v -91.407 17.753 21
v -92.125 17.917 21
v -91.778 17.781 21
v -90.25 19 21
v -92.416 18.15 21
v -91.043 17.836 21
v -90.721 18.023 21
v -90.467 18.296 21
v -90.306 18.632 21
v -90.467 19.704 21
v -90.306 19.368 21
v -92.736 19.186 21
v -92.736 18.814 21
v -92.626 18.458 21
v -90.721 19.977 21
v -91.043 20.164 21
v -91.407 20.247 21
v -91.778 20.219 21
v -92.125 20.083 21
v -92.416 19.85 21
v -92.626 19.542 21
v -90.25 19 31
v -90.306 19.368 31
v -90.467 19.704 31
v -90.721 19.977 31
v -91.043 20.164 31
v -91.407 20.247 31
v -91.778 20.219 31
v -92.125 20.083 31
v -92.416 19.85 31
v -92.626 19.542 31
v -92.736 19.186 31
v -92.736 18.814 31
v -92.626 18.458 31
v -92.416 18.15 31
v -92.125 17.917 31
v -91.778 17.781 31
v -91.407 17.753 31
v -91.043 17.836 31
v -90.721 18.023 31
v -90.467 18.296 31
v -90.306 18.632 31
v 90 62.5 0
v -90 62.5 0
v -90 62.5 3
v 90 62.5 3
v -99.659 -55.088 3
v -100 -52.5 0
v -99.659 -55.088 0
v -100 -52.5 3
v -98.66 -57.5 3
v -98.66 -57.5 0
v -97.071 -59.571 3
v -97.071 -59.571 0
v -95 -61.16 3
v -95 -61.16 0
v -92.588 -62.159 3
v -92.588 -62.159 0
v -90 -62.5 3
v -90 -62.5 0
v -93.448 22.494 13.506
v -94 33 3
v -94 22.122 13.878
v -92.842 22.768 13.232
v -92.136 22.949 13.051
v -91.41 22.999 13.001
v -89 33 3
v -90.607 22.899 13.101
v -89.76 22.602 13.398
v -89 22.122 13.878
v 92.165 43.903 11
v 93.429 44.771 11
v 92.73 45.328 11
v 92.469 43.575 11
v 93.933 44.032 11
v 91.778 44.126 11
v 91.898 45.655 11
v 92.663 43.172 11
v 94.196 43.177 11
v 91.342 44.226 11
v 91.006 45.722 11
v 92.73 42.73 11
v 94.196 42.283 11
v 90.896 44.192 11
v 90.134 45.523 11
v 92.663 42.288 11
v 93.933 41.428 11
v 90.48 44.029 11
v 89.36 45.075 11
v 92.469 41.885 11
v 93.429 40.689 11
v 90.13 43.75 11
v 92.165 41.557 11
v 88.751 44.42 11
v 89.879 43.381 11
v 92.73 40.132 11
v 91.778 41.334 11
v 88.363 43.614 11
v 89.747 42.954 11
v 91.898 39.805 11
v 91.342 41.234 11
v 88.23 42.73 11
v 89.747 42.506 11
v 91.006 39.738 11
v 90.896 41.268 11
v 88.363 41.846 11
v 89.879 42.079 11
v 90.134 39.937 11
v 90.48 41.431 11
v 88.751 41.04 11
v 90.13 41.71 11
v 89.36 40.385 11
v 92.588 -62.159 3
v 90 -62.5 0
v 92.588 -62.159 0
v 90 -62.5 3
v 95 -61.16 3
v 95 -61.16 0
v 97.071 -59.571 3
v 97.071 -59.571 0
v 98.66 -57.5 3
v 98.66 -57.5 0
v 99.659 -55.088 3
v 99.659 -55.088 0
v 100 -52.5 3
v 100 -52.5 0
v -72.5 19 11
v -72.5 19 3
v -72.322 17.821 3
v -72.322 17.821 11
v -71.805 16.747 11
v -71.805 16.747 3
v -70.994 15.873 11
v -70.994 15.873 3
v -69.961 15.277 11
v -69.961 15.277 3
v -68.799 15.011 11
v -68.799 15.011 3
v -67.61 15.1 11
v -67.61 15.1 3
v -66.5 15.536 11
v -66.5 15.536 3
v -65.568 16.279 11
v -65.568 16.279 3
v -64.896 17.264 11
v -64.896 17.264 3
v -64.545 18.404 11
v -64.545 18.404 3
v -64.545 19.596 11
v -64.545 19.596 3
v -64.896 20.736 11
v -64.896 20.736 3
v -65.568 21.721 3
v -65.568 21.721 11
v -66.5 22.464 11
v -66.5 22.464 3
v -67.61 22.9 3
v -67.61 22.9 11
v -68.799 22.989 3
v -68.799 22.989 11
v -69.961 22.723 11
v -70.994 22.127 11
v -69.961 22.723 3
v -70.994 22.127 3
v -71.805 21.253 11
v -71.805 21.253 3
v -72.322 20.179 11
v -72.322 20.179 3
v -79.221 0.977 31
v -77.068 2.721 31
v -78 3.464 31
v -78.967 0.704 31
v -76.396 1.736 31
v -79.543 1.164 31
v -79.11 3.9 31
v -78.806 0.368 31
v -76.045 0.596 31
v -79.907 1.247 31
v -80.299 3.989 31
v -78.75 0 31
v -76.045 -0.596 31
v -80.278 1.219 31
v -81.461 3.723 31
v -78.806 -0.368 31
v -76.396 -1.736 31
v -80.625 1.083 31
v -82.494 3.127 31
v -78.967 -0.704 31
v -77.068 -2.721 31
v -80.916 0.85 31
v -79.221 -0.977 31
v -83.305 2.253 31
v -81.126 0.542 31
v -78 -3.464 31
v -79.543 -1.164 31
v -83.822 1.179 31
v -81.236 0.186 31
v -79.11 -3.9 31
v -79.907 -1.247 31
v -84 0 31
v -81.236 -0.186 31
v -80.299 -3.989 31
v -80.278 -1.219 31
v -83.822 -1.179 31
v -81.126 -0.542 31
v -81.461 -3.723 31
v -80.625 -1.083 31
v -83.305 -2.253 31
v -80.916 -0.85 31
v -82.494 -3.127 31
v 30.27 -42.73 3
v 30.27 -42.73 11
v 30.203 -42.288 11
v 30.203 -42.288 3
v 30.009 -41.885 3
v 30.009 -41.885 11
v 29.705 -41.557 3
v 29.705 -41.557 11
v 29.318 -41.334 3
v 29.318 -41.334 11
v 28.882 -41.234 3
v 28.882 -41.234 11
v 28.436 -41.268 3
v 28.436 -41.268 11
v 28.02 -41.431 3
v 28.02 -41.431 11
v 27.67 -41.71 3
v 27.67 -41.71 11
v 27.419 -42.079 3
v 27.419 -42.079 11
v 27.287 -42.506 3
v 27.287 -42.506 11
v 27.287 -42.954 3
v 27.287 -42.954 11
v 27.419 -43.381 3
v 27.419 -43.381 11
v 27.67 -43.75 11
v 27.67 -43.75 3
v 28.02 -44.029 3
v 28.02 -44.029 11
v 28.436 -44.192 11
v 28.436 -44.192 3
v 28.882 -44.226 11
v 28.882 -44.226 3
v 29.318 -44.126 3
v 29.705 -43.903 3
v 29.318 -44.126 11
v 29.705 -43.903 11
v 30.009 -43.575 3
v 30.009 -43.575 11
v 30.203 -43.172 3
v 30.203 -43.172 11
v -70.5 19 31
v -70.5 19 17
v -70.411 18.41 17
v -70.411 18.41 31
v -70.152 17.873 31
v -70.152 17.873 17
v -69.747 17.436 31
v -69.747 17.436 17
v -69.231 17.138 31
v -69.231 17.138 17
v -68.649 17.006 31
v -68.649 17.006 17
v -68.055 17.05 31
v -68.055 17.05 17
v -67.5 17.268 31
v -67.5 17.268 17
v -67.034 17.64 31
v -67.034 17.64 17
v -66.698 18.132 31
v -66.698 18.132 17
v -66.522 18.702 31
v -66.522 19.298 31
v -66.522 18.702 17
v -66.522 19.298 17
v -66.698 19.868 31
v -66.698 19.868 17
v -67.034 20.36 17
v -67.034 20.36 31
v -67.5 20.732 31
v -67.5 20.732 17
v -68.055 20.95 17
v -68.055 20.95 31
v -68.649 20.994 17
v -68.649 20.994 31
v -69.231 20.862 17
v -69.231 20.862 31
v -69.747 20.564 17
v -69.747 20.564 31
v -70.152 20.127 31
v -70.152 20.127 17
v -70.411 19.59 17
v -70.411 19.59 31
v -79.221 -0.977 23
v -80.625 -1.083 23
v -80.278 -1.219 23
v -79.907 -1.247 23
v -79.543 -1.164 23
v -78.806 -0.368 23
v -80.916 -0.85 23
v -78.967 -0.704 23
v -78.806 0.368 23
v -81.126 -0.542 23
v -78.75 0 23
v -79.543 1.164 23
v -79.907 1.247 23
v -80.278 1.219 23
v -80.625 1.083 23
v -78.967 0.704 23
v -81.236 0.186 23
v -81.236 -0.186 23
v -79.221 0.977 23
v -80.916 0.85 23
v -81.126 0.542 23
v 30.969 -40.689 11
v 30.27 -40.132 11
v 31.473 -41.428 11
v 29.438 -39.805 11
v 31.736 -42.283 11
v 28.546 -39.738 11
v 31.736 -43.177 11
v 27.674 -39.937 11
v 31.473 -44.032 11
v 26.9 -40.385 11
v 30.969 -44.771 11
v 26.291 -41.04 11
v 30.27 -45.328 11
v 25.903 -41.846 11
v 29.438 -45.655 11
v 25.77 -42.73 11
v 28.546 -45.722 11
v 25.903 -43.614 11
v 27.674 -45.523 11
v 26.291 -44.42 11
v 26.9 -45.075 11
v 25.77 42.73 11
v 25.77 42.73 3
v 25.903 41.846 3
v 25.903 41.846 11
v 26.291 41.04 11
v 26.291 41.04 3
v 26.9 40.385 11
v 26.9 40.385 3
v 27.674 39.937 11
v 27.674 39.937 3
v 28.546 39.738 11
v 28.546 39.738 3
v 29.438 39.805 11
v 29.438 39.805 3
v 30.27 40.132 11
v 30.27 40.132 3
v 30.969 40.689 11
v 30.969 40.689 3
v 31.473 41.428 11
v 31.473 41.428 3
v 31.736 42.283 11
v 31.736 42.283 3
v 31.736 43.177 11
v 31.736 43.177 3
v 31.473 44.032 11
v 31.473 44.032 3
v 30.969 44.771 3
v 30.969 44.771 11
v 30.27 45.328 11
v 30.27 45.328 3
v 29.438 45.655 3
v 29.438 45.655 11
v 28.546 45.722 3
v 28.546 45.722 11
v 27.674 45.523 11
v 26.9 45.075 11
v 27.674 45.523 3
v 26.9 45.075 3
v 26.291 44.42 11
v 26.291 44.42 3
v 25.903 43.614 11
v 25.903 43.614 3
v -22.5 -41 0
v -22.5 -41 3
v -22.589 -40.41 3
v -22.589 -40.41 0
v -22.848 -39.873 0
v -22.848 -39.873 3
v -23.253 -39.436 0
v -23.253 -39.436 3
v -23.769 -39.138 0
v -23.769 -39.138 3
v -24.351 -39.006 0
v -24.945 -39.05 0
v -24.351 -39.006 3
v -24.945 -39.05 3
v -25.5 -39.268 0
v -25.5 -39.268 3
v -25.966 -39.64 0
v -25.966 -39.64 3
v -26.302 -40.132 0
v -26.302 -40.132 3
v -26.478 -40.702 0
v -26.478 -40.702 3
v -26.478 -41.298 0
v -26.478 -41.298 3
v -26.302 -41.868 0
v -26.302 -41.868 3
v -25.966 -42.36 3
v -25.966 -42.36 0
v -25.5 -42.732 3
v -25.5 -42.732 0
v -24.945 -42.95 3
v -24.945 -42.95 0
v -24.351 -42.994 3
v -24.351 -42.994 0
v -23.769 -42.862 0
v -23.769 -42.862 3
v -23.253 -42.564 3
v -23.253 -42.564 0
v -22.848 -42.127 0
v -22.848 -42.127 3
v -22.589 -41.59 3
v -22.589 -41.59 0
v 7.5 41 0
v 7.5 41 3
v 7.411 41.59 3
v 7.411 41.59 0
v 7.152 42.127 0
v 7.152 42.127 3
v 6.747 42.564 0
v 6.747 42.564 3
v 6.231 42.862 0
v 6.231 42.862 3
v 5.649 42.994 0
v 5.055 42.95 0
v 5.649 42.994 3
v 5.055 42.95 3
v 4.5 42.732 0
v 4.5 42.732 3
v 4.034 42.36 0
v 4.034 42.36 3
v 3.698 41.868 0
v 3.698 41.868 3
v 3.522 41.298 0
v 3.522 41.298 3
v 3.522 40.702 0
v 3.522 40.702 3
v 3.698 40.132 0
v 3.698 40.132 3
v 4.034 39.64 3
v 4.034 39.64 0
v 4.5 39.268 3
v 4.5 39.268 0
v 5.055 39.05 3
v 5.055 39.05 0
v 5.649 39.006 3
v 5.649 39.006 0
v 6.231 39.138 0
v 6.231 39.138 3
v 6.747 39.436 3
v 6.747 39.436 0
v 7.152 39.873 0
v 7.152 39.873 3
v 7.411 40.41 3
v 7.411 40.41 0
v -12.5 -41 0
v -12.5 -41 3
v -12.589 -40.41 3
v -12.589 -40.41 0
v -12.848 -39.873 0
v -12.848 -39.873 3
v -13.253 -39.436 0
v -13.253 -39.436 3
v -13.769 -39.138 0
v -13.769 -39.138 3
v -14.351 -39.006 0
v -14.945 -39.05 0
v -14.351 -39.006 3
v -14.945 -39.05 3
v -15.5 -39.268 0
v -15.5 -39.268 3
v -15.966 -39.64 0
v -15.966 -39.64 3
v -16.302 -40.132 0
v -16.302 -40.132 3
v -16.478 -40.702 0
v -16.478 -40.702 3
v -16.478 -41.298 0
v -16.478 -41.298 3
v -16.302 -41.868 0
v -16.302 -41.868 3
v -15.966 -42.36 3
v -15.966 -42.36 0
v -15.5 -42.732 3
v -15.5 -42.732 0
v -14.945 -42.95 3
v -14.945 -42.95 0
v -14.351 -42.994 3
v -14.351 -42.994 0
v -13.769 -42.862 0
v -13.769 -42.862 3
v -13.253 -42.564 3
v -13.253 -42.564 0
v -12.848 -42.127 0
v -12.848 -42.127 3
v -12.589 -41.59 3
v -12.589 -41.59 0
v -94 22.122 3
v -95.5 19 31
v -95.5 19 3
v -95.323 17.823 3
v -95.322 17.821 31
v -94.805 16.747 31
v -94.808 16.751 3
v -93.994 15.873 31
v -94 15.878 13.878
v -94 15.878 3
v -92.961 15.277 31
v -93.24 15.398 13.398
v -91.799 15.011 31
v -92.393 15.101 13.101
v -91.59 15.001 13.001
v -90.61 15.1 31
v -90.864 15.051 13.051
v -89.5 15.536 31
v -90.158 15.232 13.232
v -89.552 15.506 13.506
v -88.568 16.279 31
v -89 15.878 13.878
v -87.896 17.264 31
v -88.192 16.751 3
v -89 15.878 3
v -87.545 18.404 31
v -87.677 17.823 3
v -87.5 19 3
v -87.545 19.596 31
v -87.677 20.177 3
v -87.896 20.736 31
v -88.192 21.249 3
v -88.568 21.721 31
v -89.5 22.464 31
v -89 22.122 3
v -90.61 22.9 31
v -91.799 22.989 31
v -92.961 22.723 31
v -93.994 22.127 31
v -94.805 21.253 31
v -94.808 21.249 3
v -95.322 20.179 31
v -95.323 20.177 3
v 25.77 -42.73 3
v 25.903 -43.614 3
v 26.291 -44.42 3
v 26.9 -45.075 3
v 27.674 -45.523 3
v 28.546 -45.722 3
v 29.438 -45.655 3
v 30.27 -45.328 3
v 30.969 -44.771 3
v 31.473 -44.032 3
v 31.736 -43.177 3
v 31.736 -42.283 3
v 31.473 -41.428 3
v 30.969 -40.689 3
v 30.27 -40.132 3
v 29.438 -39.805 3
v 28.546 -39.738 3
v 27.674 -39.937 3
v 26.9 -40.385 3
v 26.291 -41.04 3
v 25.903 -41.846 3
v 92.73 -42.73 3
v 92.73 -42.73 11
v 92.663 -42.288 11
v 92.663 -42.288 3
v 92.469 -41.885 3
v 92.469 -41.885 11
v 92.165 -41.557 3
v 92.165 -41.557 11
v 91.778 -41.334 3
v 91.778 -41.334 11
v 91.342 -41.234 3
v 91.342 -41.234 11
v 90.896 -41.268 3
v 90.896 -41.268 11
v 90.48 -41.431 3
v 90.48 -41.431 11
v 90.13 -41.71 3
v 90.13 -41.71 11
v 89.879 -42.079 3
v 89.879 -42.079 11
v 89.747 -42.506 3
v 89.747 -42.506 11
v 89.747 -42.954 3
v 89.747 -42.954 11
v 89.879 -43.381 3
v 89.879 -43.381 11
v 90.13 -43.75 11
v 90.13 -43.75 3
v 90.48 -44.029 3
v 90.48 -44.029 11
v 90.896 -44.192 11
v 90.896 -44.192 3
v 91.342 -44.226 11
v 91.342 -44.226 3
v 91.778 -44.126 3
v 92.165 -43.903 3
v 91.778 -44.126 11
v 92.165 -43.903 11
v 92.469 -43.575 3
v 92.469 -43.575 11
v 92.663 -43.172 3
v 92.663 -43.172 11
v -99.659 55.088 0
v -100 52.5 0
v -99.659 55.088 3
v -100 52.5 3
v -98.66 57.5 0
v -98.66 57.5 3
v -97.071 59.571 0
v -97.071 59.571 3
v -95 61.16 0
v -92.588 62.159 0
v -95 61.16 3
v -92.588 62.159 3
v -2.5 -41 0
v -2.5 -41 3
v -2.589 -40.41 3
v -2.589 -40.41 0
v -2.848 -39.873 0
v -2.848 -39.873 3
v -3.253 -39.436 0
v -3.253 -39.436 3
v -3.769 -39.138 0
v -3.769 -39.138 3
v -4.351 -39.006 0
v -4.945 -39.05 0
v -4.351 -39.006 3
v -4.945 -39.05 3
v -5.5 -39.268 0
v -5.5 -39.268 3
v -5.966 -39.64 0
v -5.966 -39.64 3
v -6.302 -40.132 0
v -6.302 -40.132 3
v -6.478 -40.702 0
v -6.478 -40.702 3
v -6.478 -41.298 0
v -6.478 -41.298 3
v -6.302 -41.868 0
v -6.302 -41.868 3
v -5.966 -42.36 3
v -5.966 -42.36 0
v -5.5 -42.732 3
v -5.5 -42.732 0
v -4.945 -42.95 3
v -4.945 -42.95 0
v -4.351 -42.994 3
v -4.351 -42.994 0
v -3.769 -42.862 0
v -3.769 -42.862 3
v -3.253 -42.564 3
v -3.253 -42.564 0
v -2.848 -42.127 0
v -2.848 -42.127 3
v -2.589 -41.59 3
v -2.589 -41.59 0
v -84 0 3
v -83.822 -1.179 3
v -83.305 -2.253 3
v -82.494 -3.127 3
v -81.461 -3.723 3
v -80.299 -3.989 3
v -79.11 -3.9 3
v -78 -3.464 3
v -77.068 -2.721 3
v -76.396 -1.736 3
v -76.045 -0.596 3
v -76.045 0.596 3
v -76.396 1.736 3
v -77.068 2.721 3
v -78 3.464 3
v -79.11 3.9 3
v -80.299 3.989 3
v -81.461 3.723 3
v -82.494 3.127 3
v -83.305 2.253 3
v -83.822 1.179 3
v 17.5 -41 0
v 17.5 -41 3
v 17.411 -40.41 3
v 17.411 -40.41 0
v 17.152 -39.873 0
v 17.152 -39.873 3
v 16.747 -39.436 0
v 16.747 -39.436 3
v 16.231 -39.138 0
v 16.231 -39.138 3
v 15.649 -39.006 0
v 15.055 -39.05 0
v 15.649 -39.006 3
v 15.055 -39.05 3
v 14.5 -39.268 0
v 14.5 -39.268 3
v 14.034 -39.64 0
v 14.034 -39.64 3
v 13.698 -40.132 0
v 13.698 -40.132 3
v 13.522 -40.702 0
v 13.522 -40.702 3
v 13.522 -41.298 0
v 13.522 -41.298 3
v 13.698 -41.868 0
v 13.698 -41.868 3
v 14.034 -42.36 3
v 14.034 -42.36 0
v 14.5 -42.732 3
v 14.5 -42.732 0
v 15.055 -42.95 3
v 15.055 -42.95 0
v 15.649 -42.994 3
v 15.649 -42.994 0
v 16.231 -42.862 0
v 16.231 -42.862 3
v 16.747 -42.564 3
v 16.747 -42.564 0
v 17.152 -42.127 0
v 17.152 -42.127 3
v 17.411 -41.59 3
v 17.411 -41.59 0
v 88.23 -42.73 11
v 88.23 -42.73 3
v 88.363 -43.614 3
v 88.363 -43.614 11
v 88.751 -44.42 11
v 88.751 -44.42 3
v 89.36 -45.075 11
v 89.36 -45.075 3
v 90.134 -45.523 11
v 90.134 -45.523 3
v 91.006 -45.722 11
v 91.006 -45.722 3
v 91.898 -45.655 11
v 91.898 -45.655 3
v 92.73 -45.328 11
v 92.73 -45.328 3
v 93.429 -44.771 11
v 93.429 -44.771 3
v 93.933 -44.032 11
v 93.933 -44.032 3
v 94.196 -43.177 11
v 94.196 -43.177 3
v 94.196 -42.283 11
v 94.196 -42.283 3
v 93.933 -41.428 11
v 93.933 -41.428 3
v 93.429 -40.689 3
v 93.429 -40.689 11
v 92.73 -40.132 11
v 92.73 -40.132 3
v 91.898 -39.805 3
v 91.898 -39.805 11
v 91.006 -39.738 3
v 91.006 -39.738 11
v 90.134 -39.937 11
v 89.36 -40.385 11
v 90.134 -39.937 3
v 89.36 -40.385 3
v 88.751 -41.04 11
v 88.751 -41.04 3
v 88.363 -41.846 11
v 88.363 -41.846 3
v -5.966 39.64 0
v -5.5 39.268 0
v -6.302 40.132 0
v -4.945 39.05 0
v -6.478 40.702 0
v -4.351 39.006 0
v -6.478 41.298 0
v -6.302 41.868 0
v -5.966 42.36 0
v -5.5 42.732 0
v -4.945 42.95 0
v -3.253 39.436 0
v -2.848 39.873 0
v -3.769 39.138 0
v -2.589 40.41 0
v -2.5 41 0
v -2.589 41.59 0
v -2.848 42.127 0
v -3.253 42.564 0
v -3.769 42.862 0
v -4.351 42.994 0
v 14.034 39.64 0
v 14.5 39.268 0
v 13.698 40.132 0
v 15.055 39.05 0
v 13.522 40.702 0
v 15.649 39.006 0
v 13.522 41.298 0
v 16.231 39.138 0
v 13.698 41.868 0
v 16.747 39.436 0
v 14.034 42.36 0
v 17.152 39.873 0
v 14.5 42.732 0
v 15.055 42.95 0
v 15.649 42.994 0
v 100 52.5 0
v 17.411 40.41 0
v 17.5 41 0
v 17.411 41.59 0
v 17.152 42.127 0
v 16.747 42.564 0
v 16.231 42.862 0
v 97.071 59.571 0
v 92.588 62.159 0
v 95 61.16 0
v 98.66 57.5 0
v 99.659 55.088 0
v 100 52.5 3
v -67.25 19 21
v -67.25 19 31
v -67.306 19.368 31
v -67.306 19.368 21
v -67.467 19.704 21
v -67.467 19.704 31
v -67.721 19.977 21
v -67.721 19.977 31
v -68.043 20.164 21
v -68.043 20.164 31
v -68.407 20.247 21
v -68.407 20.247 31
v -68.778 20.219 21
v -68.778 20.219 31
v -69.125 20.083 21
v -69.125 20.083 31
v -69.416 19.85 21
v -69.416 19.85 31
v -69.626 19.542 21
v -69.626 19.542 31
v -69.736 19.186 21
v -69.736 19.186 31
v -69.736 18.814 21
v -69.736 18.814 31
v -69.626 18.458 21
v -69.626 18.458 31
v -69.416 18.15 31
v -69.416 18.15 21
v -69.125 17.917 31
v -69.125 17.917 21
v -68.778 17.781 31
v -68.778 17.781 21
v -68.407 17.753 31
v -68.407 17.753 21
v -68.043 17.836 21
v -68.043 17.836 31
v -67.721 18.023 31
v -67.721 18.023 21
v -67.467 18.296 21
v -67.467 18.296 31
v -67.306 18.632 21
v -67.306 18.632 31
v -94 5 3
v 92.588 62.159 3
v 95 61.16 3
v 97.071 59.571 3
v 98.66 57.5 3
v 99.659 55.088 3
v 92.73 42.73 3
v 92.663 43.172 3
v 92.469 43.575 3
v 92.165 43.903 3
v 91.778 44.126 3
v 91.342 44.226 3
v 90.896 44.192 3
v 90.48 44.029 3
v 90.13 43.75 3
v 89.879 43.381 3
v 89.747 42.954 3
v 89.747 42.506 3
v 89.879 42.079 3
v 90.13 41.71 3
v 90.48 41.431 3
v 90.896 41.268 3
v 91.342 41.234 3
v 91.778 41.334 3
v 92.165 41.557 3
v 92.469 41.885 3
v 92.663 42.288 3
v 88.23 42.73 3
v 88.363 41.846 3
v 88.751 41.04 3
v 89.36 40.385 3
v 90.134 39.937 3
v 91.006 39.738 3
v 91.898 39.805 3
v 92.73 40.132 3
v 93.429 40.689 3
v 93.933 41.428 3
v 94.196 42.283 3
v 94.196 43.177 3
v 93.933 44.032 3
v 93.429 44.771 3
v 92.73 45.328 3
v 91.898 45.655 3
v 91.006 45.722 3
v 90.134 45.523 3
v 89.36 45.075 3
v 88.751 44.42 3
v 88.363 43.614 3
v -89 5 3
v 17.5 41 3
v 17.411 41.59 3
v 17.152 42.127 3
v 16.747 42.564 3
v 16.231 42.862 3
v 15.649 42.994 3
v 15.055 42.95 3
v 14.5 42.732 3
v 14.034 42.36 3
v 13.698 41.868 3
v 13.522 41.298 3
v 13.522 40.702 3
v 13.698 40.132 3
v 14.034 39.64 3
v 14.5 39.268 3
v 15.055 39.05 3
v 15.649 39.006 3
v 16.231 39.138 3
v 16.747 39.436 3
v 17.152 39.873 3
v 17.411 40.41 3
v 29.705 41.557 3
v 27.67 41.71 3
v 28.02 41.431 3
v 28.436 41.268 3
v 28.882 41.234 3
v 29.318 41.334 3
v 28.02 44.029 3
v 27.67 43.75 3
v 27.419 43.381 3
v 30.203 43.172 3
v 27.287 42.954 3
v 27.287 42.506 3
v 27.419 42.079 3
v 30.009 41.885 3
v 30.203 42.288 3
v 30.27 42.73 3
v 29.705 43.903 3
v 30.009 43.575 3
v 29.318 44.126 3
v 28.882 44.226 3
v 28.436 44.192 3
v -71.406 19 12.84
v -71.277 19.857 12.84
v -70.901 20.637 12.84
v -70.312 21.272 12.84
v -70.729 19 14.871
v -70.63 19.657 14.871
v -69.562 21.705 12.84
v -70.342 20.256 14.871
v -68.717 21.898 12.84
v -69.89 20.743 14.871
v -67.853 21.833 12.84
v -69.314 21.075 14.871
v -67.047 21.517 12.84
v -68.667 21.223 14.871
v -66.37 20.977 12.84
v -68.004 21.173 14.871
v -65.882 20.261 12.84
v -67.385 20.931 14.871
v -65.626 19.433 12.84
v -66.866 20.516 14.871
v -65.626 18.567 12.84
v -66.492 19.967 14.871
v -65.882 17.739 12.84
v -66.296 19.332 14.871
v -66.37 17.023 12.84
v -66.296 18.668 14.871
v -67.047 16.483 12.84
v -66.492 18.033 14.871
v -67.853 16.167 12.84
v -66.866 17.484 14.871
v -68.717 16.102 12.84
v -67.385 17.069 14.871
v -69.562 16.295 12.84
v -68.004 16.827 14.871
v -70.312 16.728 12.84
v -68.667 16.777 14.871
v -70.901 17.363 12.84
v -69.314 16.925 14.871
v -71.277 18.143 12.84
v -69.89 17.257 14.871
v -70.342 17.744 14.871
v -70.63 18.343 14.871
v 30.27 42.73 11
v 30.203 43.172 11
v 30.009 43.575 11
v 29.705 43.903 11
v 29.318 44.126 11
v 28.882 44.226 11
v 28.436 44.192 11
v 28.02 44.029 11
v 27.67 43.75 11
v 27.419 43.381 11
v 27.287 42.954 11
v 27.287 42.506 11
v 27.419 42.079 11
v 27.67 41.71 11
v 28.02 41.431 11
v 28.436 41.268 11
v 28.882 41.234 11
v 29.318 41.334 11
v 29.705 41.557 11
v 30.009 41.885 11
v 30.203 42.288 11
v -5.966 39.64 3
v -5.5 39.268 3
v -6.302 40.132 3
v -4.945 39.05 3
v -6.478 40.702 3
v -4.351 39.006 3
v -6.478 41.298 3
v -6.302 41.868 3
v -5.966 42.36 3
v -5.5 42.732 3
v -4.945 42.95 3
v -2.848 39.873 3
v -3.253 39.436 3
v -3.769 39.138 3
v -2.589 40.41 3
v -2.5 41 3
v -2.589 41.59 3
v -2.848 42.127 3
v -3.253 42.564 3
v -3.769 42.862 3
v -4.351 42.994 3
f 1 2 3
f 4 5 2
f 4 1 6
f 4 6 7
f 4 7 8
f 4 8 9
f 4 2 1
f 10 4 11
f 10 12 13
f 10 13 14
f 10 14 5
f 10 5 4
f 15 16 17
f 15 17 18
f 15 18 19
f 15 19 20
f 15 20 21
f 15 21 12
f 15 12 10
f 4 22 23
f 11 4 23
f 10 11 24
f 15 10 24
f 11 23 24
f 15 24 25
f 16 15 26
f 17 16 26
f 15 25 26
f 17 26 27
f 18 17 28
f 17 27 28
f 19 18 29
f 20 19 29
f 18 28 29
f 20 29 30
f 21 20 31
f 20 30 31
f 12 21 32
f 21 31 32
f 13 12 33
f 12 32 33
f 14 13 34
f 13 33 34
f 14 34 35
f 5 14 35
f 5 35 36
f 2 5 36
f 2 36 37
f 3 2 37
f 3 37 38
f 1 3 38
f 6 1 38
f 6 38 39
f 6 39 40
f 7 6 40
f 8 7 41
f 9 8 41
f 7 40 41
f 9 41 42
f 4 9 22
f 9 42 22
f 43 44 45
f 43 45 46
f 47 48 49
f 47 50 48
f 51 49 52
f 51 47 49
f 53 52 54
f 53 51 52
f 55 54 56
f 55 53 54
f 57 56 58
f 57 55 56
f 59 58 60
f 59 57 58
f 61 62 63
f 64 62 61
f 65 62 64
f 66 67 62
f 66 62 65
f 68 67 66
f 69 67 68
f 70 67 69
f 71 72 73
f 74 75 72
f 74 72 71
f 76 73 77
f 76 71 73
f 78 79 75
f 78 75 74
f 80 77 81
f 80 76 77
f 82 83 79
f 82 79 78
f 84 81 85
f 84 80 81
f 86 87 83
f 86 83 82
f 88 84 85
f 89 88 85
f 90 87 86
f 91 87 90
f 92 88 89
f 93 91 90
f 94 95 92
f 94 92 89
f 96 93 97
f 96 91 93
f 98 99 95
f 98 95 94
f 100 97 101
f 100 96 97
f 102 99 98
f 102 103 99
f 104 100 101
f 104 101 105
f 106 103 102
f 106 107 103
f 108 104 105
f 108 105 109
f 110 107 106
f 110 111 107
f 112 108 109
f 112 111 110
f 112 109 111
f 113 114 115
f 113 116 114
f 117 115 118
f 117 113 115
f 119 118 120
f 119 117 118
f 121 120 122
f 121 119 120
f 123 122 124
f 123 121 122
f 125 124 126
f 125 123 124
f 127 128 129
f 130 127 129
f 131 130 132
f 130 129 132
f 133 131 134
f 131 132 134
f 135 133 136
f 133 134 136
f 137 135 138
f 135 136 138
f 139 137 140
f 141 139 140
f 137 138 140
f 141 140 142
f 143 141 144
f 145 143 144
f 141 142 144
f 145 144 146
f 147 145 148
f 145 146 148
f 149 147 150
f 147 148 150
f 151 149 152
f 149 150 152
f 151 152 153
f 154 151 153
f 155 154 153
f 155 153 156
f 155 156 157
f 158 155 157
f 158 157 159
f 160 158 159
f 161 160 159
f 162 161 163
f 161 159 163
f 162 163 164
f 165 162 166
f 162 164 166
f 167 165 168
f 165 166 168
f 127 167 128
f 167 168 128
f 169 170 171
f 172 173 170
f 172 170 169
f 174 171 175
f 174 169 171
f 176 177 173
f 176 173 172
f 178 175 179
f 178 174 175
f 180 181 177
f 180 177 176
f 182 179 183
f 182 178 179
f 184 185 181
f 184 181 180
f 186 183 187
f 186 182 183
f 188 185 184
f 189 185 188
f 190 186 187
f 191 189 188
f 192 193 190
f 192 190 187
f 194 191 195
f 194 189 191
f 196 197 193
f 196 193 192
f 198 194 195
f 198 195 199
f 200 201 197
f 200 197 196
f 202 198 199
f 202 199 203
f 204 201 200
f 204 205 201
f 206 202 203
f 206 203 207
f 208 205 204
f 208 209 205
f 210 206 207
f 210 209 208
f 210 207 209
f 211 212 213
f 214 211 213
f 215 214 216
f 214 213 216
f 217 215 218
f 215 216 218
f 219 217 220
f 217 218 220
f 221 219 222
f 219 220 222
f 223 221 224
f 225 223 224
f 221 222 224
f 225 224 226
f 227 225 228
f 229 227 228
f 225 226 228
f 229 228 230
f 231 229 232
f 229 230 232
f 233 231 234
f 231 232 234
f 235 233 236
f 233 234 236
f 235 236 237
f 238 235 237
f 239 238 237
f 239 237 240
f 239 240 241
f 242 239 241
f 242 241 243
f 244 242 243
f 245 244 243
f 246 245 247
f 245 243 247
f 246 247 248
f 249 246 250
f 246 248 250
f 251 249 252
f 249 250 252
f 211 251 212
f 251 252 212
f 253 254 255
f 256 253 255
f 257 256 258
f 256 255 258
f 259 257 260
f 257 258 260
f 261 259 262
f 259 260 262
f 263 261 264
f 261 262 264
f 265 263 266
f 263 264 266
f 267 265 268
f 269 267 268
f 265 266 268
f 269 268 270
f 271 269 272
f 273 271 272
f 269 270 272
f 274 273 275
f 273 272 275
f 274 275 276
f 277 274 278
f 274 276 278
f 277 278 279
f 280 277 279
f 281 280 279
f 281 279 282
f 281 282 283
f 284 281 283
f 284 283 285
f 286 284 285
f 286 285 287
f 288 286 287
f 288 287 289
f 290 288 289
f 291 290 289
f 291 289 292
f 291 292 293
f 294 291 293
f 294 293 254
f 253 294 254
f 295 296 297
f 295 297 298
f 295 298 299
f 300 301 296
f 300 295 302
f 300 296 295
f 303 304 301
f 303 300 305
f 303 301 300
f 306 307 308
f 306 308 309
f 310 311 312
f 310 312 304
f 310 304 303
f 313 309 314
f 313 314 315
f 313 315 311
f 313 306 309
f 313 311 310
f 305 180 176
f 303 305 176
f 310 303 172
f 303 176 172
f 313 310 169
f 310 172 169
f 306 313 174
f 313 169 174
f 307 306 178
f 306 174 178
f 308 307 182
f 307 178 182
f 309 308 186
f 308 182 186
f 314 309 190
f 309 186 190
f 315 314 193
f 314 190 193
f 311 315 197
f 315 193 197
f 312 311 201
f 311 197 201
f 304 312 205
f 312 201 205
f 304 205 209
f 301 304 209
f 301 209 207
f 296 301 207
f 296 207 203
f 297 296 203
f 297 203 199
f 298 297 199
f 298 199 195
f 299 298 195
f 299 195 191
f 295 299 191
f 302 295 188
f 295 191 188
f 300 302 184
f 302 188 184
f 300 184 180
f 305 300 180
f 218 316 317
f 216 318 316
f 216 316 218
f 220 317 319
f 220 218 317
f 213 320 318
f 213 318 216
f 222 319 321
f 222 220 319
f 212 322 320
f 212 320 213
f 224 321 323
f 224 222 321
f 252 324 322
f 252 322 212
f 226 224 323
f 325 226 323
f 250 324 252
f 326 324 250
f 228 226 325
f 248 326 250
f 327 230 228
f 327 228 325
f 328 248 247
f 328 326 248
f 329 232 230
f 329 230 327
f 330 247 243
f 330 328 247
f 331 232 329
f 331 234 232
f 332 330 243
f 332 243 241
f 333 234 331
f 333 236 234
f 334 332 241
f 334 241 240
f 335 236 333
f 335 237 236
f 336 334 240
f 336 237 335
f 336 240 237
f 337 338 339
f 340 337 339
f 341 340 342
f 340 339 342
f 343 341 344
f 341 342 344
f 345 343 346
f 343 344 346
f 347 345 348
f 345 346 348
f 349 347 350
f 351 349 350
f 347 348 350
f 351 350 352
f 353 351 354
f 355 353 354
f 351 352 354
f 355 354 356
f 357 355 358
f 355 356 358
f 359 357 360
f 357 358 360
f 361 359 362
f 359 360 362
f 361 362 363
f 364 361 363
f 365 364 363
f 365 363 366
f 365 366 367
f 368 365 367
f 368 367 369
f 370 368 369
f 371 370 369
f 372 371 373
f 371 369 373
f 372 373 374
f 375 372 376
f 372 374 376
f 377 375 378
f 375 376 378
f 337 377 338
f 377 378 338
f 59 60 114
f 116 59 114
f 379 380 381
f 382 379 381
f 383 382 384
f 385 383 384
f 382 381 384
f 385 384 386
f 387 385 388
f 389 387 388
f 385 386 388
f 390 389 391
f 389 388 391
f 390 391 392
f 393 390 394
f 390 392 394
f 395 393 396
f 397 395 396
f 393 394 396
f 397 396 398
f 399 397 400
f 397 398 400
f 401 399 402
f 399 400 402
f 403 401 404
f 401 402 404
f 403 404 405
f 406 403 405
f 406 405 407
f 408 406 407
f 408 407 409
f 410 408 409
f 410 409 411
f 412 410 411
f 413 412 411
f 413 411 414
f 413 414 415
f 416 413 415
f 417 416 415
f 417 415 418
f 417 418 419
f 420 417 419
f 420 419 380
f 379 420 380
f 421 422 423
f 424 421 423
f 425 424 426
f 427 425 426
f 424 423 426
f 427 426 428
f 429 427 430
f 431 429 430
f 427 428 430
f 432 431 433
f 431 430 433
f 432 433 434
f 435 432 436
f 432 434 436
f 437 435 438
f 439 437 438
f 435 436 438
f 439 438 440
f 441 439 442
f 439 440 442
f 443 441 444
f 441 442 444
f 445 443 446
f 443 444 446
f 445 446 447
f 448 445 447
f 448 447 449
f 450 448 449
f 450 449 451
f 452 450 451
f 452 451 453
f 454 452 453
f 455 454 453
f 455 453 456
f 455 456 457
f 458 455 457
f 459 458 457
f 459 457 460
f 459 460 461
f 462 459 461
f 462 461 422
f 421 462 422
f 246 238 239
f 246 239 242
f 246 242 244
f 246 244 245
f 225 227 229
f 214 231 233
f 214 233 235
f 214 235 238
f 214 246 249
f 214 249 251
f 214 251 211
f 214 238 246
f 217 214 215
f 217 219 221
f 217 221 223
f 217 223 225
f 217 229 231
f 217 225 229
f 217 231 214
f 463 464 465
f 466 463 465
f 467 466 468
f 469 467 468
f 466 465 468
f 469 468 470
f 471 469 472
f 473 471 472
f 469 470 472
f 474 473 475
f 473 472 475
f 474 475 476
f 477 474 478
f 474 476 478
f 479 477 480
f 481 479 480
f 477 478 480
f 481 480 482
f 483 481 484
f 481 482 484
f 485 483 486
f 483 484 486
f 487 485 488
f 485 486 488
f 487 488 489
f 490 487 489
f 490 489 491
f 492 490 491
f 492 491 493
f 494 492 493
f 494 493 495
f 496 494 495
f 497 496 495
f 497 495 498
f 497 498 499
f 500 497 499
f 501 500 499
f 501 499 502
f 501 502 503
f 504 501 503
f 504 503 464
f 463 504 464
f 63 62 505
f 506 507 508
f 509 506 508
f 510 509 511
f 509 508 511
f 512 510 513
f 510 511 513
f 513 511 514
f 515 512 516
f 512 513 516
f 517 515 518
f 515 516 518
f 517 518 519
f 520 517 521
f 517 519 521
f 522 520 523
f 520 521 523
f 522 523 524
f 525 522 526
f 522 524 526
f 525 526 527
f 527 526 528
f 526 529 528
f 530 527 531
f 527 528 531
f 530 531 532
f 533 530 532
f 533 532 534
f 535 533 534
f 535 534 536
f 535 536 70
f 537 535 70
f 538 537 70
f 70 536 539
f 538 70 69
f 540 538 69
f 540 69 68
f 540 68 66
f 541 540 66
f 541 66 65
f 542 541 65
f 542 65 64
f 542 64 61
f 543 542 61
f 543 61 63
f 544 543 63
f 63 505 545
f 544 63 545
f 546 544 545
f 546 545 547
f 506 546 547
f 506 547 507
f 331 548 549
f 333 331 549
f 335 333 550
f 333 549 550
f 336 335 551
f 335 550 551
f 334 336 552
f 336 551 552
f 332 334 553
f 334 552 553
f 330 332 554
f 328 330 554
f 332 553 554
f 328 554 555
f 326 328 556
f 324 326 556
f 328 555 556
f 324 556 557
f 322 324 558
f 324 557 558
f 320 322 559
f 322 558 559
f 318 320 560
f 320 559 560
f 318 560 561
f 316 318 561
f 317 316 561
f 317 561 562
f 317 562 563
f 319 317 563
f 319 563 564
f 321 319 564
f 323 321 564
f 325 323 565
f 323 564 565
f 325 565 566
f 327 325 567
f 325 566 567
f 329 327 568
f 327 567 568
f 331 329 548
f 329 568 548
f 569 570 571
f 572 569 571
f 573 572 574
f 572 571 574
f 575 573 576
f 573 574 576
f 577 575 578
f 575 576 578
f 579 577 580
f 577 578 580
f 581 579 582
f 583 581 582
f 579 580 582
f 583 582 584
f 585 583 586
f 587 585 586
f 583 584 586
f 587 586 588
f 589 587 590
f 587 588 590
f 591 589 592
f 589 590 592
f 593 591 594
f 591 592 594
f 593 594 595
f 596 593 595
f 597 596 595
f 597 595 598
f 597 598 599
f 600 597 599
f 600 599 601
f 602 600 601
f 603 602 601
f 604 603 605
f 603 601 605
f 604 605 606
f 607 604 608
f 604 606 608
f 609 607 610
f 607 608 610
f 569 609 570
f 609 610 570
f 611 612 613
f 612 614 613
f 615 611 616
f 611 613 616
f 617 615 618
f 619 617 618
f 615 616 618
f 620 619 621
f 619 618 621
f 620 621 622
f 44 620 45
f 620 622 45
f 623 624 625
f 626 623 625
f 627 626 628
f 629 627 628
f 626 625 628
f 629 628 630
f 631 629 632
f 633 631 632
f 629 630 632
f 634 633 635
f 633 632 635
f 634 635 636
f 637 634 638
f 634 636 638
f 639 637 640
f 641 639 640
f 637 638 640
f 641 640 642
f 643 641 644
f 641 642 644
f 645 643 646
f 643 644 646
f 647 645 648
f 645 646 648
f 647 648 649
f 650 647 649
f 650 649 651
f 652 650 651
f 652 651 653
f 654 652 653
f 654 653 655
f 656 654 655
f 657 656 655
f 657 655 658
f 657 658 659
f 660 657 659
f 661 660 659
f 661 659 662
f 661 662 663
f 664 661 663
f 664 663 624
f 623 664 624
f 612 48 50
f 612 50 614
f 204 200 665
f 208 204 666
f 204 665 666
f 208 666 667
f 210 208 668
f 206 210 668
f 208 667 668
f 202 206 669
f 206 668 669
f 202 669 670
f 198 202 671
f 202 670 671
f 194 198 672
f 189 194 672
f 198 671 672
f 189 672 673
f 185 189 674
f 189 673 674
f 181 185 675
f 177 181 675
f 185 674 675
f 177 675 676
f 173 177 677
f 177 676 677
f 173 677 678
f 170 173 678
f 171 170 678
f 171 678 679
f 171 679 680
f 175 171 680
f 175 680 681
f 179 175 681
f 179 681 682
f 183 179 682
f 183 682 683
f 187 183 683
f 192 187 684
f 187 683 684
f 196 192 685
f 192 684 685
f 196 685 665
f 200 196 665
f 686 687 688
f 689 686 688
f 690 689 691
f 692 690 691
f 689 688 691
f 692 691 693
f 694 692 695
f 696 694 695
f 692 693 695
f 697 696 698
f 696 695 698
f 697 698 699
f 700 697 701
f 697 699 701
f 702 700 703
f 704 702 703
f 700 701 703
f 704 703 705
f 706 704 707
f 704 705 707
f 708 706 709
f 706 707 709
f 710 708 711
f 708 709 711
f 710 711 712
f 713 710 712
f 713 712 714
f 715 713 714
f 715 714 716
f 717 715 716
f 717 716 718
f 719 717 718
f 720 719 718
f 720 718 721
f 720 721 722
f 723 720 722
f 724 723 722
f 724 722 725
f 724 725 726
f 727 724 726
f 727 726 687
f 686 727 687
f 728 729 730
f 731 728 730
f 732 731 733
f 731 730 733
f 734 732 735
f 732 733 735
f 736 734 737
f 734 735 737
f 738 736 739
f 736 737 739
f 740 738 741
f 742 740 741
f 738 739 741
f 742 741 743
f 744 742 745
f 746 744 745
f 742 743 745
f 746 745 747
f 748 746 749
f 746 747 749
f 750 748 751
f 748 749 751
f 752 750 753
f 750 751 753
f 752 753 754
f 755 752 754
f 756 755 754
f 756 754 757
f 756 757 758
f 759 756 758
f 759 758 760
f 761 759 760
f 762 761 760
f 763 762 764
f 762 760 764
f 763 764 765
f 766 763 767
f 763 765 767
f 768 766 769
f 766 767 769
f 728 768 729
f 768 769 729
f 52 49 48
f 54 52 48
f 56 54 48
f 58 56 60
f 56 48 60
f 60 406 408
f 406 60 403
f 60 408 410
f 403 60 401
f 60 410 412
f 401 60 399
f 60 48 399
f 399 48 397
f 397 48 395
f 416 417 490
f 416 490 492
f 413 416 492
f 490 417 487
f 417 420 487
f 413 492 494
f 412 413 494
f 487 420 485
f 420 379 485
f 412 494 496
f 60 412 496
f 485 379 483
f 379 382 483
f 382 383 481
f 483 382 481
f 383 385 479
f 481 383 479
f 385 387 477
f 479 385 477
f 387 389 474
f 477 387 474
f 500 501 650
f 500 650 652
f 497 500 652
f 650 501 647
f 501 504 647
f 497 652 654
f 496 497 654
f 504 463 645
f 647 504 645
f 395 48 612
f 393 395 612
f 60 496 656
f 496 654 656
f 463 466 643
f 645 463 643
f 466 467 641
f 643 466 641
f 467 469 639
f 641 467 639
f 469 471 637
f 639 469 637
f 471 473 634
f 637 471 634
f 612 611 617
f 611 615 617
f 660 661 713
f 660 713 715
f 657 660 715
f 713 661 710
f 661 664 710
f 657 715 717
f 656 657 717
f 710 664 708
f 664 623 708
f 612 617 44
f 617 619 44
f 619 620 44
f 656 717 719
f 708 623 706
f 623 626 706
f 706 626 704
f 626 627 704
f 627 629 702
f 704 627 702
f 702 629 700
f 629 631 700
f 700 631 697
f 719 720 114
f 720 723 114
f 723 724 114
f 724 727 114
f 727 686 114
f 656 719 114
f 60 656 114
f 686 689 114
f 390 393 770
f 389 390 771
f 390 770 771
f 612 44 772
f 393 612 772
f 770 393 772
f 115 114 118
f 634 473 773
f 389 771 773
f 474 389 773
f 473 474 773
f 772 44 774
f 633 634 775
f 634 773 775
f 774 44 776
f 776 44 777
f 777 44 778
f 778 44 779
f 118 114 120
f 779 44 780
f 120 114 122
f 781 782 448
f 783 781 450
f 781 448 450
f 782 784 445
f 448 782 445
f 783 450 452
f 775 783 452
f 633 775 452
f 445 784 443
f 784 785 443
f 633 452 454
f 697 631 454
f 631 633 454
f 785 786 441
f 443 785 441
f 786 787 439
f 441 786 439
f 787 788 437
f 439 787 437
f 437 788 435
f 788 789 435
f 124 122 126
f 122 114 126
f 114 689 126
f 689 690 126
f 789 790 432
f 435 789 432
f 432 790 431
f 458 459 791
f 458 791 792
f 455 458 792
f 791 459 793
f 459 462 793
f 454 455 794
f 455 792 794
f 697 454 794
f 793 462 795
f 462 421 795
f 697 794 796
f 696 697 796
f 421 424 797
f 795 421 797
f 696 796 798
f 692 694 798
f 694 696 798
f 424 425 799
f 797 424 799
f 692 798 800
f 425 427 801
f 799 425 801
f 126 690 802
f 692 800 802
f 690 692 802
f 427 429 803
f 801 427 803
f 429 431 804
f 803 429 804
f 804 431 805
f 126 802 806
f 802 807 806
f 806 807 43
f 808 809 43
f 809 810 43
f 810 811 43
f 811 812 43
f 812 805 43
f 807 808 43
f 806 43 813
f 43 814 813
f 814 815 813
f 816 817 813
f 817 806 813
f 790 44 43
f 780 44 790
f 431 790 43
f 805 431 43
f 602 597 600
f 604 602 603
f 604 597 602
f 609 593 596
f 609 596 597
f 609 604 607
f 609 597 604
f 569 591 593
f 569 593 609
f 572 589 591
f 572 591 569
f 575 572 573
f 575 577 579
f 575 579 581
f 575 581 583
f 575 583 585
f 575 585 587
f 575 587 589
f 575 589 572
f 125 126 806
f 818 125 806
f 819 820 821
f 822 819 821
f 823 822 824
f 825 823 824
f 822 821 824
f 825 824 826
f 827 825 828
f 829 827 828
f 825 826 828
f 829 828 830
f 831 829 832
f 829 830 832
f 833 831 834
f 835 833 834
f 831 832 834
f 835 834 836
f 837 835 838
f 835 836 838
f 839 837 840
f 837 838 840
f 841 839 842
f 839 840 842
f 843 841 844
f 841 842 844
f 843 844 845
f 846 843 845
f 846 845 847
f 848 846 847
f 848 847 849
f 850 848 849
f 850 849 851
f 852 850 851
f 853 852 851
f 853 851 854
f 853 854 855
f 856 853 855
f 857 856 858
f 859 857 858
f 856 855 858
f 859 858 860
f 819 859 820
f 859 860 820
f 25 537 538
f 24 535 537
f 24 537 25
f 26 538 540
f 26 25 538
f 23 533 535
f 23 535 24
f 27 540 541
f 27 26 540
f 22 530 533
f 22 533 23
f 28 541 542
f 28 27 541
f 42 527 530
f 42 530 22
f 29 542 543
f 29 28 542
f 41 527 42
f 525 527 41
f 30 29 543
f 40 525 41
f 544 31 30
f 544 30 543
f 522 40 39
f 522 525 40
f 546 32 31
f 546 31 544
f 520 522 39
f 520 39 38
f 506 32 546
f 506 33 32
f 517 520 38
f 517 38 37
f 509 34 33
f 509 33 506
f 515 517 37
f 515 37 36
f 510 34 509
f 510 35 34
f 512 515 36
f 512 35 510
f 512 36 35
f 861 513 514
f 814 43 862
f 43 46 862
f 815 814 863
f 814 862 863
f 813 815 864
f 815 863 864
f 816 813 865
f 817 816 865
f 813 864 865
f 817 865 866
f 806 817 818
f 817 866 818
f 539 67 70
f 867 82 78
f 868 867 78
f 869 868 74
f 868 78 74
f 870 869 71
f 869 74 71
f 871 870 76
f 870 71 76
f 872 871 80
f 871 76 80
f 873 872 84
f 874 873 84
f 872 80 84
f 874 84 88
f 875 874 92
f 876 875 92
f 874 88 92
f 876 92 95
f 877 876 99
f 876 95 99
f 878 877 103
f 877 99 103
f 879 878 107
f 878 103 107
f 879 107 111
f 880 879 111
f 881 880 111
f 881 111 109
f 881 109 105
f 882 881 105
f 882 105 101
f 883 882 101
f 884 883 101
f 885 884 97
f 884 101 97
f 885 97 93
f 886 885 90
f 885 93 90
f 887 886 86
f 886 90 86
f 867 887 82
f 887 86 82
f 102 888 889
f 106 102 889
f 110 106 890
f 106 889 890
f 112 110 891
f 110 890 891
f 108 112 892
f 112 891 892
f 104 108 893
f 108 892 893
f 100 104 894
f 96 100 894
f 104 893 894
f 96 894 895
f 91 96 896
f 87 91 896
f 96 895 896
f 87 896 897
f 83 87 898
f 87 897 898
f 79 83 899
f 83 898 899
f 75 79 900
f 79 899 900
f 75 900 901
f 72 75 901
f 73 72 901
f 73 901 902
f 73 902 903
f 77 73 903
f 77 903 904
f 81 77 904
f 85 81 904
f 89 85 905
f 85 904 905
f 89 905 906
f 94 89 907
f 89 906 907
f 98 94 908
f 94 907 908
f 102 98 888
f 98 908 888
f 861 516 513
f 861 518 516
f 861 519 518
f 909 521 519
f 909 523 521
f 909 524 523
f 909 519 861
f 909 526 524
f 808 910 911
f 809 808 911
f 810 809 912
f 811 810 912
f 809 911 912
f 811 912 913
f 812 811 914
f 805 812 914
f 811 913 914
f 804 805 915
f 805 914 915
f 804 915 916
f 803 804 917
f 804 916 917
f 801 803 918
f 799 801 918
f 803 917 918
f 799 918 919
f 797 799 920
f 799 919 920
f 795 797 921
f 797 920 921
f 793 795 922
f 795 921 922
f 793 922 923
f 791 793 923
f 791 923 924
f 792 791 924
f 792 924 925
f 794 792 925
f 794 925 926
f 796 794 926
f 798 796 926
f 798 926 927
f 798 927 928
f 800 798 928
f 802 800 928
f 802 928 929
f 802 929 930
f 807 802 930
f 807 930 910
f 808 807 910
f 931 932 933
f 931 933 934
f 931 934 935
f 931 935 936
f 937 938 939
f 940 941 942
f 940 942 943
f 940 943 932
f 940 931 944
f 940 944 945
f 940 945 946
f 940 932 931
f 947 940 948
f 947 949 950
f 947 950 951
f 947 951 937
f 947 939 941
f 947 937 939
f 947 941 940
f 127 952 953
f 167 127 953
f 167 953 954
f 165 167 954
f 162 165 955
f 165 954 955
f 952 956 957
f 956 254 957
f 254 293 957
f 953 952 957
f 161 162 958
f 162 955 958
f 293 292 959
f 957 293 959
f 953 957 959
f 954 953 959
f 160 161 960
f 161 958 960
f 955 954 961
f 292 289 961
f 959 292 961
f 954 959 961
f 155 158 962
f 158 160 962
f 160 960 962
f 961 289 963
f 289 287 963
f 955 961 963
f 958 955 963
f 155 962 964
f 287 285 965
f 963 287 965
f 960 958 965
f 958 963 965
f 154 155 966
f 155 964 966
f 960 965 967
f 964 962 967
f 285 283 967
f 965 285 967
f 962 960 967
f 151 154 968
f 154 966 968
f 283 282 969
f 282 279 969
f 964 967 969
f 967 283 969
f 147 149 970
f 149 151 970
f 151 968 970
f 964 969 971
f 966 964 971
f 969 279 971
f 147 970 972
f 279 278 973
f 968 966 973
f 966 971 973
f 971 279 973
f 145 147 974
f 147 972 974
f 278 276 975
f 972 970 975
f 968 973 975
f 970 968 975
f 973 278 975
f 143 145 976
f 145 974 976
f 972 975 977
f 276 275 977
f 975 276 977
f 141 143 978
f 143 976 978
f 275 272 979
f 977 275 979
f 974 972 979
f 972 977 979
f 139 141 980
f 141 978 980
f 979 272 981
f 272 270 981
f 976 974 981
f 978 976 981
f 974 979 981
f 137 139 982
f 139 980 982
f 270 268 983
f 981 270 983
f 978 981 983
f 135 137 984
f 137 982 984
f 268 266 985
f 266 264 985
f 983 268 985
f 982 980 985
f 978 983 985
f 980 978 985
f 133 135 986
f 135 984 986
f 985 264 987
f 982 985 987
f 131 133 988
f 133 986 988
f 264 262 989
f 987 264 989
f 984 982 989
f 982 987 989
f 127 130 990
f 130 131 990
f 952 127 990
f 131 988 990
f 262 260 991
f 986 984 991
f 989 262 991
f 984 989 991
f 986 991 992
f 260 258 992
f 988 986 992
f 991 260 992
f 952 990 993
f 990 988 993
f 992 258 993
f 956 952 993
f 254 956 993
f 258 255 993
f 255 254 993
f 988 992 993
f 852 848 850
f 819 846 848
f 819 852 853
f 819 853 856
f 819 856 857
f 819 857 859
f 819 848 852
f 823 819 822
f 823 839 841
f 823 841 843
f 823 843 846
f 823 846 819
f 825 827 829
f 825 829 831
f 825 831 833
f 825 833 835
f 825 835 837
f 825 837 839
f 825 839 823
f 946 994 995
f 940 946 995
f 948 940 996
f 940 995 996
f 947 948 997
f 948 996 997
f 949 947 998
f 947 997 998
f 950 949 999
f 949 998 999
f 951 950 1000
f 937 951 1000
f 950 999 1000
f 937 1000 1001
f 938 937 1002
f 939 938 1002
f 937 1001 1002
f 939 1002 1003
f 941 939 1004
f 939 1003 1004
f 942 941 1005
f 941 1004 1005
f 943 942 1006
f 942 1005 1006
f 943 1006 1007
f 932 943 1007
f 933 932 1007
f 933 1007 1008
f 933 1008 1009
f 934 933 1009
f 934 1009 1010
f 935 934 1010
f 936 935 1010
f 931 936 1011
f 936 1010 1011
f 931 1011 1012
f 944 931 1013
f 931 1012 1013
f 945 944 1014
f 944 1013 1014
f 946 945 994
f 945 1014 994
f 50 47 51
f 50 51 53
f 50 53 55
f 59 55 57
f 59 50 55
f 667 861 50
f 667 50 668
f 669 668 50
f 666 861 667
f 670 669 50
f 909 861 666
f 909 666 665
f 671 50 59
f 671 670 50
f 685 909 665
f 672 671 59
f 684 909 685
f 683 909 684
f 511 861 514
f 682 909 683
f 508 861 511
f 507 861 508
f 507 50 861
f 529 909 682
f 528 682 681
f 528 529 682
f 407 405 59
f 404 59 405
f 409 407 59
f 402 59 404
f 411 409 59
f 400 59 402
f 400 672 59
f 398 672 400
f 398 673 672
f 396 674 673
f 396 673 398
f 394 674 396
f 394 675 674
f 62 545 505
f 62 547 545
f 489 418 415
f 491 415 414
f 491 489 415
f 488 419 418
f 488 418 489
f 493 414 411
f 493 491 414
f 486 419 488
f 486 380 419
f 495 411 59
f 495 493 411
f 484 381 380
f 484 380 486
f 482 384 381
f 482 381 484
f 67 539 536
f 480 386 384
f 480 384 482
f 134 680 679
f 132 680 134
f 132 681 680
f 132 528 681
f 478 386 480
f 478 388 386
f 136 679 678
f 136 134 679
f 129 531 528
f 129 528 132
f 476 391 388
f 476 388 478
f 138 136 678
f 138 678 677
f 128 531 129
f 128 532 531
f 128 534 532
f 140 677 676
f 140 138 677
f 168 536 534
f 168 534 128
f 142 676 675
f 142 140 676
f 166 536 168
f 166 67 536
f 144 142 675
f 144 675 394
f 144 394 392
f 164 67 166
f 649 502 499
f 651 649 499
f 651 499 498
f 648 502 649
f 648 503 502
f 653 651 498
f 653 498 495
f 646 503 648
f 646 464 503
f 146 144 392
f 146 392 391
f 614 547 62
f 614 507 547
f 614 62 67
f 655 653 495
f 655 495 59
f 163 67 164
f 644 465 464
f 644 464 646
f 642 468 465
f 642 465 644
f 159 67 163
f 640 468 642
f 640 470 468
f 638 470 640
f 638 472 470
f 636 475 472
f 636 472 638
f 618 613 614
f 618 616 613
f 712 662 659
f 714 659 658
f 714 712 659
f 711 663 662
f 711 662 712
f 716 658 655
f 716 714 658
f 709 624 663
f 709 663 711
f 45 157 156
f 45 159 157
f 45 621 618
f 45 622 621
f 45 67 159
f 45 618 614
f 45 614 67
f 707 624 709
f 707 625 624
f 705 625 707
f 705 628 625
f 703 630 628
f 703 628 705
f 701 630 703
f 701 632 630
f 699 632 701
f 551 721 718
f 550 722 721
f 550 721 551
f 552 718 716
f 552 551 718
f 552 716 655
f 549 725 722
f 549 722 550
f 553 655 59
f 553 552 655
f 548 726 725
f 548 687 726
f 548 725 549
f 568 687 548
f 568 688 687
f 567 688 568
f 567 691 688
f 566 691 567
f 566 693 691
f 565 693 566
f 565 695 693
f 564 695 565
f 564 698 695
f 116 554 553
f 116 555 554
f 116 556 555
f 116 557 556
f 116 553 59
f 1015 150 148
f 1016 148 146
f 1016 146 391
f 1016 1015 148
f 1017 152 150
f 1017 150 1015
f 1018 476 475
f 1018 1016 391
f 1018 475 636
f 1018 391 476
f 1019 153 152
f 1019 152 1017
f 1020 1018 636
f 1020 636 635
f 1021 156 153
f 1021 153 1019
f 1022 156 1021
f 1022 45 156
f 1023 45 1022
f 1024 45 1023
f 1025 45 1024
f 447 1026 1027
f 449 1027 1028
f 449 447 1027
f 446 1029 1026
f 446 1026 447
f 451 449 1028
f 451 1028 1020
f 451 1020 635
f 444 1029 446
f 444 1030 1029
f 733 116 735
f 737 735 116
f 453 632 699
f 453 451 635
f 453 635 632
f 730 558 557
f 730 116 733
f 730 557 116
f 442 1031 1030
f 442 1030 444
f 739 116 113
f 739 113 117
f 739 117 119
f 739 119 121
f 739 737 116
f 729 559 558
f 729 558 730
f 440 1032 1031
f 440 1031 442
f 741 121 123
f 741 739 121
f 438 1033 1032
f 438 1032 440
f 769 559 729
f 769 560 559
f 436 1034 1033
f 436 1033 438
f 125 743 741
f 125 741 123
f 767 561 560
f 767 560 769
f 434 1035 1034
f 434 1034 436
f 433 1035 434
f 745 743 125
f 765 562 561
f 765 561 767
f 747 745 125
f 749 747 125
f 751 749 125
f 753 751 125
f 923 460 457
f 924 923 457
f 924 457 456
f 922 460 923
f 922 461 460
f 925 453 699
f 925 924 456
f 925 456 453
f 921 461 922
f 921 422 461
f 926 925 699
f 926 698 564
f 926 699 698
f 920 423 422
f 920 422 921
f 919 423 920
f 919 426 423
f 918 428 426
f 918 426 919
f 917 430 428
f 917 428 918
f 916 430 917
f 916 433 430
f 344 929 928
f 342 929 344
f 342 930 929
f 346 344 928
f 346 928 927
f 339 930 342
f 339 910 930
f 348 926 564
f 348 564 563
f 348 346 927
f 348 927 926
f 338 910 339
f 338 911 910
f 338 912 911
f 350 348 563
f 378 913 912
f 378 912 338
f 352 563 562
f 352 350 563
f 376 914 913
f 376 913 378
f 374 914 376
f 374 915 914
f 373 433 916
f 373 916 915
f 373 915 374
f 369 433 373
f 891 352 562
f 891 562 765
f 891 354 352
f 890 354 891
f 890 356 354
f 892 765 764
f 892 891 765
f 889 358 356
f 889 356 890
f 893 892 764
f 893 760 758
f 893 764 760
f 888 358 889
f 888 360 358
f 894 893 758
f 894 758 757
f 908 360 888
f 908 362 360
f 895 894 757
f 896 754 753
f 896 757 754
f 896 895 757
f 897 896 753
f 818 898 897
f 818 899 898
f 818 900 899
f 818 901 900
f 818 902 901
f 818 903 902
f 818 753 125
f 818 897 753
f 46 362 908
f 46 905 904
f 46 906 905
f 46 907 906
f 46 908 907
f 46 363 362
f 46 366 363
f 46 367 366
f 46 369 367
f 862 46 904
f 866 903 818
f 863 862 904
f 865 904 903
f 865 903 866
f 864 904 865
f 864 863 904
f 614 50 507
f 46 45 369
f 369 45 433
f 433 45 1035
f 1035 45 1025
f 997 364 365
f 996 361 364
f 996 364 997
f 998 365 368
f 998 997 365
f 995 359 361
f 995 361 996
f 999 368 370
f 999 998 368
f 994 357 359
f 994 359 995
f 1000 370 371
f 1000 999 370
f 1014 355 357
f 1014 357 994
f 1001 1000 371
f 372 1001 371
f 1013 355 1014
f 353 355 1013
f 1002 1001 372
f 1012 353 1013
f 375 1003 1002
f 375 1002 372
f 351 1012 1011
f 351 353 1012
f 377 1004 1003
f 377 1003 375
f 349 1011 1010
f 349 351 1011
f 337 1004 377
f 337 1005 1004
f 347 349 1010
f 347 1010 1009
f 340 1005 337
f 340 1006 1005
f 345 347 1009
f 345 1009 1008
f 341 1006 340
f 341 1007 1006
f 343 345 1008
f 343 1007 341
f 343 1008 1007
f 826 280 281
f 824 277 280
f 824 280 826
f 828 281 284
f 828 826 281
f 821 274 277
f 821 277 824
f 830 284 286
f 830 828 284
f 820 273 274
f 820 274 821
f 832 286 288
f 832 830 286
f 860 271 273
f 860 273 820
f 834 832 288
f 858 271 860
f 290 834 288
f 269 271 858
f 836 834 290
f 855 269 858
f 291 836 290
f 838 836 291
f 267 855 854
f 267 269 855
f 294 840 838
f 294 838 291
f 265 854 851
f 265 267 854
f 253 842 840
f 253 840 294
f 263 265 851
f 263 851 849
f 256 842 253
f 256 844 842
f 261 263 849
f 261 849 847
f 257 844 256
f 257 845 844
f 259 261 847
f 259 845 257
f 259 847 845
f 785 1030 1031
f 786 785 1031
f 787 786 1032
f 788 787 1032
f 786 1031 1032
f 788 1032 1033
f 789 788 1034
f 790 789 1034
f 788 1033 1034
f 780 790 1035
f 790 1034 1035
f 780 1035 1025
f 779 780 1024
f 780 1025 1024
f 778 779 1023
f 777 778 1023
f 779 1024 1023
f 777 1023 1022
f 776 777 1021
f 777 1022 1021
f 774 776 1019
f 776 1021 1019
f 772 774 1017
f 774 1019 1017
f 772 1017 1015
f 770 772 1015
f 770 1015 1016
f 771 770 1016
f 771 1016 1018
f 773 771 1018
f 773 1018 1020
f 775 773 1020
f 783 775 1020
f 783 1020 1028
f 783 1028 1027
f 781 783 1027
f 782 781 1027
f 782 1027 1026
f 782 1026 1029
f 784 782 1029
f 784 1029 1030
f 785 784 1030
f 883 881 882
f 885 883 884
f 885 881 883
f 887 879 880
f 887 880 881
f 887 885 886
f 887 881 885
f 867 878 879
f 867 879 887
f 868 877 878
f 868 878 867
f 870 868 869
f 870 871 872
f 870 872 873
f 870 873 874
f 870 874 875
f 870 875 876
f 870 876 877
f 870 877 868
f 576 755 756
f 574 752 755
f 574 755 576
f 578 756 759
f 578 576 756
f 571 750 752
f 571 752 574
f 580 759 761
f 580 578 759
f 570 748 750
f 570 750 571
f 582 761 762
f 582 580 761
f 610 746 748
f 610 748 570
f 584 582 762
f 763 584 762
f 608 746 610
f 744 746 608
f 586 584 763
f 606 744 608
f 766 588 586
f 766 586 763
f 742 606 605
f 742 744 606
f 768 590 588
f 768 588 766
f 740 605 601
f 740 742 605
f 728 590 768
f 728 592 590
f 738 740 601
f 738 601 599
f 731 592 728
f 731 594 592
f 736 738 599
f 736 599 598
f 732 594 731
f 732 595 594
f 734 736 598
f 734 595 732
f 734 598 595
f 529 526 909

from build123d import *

# Parameters (mm, degrees)
SKETCH_1_W          = 200
SKETCH_1_H          = 125
EXTRUDE_1_DEPTH     = 3
SKETCH_2_R          = 4
SKETCH_2_R_2        = 2
EXTRUDE_2_DEPTH     = 28
SKETCH_3_R          = 1.25
CUT_EXTRUDE_1_DEPTH = 10
SKETCH_4_R          = 2
CUT_EXTRUDE_2_DEPTH = 122.203341538
SKETCH_5_R          = 3
EXTRUDE_3_DEPTH     = 8
SKETCH_6_R          = 1.5
CUT_EXTRUDE_3_DEPTH = 8
FILLET_1_R          = 10
RIB_1_REACH         = 205.812
SKETCH_9_WALL_W     = 423.76696313
SKETCH_9_WALL_H     = 5
RIB_2_REACH         = 205.812
SKETCH_10_WALL_W    = 423.76696313
SKETCH_10_WALL_H    = 5
SKETCH_13_R         = 4
EXTRUDE_4_DEPTH     = 8
FILLET_3_R          = 10
SKETCH_14_R         = 1.25
CUT_EXTRUDE_4_DEPTH = 8


with BuildPart() as part:
    # 草图1 → 凸台-拉伸1 (new body)
    with BuildSketch(Plane.XY):
        Rectangle(SKETCH_1_W, SKETCH_1_H)
    extrude(amount=EXTRUDE_1_DEPTH)

    # 草图2 → 凸台-拉伸2 (add)
    with BuildSketch(Plane.XY.offset(3)):
        with Locations(Location((-91.5, 19, 0), (0, 0, 180))):
            Circle(SKETCH_2_R)
        with Locations(Location((-68.5, 19, 0), (0, 0, 180))):
            Circle(SKETCH_2_R_2)
        with Locations(Location((-80, 0, 0), (0, 0, 180))):
            Circle(SKETCH_2_R)
    extrude(amount=EXTRUDE_2_DEPTH)

    # 草图3 → 切除-拉伸1 (cut)
    with BuildSketch(Plane.XY.offset(31)):
        with Locations((-91.5, 19)):
            Circle(SKETCH_3_R)
        with Locations((-68.5, 19)):
            Circle(SKETCH_3_R)
    extrude(amount=-CUT_EXTRUDE_1_DEPTH, mode=Mode.SUBTRACT)

    # 草图4 → 切除-拉伸2 (cut, through all)
    with BuildSketch(Plane.XY.offset(3)):
        with Locations((15.5, 41)):
            Circle(SKETCH_4_R)
        with Locations((15.5, -41)):
            Circle(SKETCH_4_R)
        with Locations((5.5, 41)):
            Circle(SKETCH_4_R)
        with Locations((-4.5, 41)):
            Circle(SKETCH_4_R)
        with Locations((-14.5, -41)):
            Circle(SKETCH_4_R)
        with Locations((-24.5, -41)):
            Circle(SKETCH_4_R)
        with Locations((-4.5, -41)):
            Circle(SKETCH_4_R)
    extrude(amount=-CUT_EXTRUDE_2_DEPTH, mode=Mode.SUBTRACT)

    # 草图5 → 凸台-拉伸3 (add)
    with BuildSketch(Plane.XY.offset(3)):
        with Locations(Location((28.77, 42.73, 0), (0, 0, 180))):
            Circle(SKETCH_5_R)
        with Locations(Location((28.77, -42.73, 0), (0, 0, 180))):
            Circle(SKETCH_5_R)
        with Locations(Location((91.23, -42.73, 0), (0, 0, 180))):
            Circle(SKETCH_5_R)
        with Locations(Location((91.23, 42.73, 0), (0, 0, 180))):
            Circle(SKETCH_5_R)
    extrude(amount=EXTRUDE_3_DEPTH)

    # 草图6 → 切除-拉伸3 (cut)
    with BuildSketch(Plane.XY.offset(11)):
        with Locations((28.77, 42.73)):
            Circle(SKETCH_6_R)
        with Locations((91.23, 42.73)):
            Circle(SKETCH_6_R)
        with Locations((28.77, -42.73)):
            Circle(SKETCH_6_R)
        with Locations((91.23, -42.73)):
            Circle(SKETCH_6_R)
    extrude(amount=-CUT_EXTRUDE_3_DEPTH, mode=Mode.SUBTRACT)

    # 圆角1
    fillet_1_edges = [part.edges().sort_by_distance(p)[0] for p in [
        (100, -62.5, 1.5),
        (-100, -62.5, 1.5),
        (-100, 62.5, 1.5),
        (100, 62.5, 1.5),
    ]]
    fillet(fillet_1_edges, radius=FILLET_1_R)

    # 草图9 wall → 筋1 (add, up to next)
    with BuildSketch(Plane(origin=(-91.5, 28, 8), x_dir=(0, -0.707106781187, 0.707106781187), z_dir=(0, 0.707106781187, 0.707106781187)), mode=Mode.PRIVATE) as rib_1_sk1:
        Rectangle(SKETCH_9_WALL_W, SKETCH_9_WALL_H)
    rib_1_tool1 = extrude(rib_1_sk1.sketch, amount=-RIB_1_REACH, mode=Mode.PRIVATE) - part.part
    add(rib_1_tool1.solids().sort_by_distance((-91.5, 28, 8))[0])

    # 草图10 wall → 筋2 (add, up to next)
    with BuildSketch(Plane(origin=(-91.5, 10, 8), x_dir=(0, -0.707106781187, -0.707106781187), z_dir=(0, -0.707106781187, 0.707106781187)), mode=Mode.PRIVATE) as rib_2_sk1:
        Rectangle(SKETCH_10_WALL_W, SKETCH_10_WALL_H)
    rib_2_tool1 = extrude(rib_2_sk1.sketch, amount=-RIB_2_REACH, mode=Mode.PRIVATE) - part.part
    add(rib_2_tool1.solids().sort_by_distance((-91.5, 10, 8))[0])

    # 草图13 → 凸台-拉伸4 (add)
    with BuildSketch(Plane.XY.offset(3)):
        with Locations(Location((-68.5, 19, 0), (0, 0, 180))):
            Circle(SKETCH_13_R)
    extrude(amount=EXTRUDE_4_DEPTH)

    # 圆角3
    # the kernel refuses this fillet: 10 mm, written as the material it adds along each edge
    with BuildSketch(Plane(origin=(-68.5, 19, 11), x_dir=(-1, 0, 0), z_dir=(0, -1, 0))) as fillet_3_piece_1:
        with BuildLine():
            CenterArc((12, -6), FILLET_3_R, 143.130102354, 36.869897646)
            Line((2, -6), (1.8, -6))
            Line((1.8, -6), (1.8, 0))
            Line((1.8, 0), (2, 0.2))
            ThreePointArc((2, 0.2), (3, 0.2), (3.84, 0.12))
            Line((3.84, 0.12), (4, 0))
        make_face()
    revolve(axis=Axis((-68.5, 19, 11), (0, 0, -1)))

    # 草图14 → 切除-拉伸4 (cut)
    with BuildSketch(Plane.XY.offset(31)):
        with Locations((-80, 0)):
            Circle(SKETCH_14_R)
    extrude(amount=-CUT_EXTRUDE_4_DEPTH, mode=Mode.SUBTRACT)


solid = part.part
